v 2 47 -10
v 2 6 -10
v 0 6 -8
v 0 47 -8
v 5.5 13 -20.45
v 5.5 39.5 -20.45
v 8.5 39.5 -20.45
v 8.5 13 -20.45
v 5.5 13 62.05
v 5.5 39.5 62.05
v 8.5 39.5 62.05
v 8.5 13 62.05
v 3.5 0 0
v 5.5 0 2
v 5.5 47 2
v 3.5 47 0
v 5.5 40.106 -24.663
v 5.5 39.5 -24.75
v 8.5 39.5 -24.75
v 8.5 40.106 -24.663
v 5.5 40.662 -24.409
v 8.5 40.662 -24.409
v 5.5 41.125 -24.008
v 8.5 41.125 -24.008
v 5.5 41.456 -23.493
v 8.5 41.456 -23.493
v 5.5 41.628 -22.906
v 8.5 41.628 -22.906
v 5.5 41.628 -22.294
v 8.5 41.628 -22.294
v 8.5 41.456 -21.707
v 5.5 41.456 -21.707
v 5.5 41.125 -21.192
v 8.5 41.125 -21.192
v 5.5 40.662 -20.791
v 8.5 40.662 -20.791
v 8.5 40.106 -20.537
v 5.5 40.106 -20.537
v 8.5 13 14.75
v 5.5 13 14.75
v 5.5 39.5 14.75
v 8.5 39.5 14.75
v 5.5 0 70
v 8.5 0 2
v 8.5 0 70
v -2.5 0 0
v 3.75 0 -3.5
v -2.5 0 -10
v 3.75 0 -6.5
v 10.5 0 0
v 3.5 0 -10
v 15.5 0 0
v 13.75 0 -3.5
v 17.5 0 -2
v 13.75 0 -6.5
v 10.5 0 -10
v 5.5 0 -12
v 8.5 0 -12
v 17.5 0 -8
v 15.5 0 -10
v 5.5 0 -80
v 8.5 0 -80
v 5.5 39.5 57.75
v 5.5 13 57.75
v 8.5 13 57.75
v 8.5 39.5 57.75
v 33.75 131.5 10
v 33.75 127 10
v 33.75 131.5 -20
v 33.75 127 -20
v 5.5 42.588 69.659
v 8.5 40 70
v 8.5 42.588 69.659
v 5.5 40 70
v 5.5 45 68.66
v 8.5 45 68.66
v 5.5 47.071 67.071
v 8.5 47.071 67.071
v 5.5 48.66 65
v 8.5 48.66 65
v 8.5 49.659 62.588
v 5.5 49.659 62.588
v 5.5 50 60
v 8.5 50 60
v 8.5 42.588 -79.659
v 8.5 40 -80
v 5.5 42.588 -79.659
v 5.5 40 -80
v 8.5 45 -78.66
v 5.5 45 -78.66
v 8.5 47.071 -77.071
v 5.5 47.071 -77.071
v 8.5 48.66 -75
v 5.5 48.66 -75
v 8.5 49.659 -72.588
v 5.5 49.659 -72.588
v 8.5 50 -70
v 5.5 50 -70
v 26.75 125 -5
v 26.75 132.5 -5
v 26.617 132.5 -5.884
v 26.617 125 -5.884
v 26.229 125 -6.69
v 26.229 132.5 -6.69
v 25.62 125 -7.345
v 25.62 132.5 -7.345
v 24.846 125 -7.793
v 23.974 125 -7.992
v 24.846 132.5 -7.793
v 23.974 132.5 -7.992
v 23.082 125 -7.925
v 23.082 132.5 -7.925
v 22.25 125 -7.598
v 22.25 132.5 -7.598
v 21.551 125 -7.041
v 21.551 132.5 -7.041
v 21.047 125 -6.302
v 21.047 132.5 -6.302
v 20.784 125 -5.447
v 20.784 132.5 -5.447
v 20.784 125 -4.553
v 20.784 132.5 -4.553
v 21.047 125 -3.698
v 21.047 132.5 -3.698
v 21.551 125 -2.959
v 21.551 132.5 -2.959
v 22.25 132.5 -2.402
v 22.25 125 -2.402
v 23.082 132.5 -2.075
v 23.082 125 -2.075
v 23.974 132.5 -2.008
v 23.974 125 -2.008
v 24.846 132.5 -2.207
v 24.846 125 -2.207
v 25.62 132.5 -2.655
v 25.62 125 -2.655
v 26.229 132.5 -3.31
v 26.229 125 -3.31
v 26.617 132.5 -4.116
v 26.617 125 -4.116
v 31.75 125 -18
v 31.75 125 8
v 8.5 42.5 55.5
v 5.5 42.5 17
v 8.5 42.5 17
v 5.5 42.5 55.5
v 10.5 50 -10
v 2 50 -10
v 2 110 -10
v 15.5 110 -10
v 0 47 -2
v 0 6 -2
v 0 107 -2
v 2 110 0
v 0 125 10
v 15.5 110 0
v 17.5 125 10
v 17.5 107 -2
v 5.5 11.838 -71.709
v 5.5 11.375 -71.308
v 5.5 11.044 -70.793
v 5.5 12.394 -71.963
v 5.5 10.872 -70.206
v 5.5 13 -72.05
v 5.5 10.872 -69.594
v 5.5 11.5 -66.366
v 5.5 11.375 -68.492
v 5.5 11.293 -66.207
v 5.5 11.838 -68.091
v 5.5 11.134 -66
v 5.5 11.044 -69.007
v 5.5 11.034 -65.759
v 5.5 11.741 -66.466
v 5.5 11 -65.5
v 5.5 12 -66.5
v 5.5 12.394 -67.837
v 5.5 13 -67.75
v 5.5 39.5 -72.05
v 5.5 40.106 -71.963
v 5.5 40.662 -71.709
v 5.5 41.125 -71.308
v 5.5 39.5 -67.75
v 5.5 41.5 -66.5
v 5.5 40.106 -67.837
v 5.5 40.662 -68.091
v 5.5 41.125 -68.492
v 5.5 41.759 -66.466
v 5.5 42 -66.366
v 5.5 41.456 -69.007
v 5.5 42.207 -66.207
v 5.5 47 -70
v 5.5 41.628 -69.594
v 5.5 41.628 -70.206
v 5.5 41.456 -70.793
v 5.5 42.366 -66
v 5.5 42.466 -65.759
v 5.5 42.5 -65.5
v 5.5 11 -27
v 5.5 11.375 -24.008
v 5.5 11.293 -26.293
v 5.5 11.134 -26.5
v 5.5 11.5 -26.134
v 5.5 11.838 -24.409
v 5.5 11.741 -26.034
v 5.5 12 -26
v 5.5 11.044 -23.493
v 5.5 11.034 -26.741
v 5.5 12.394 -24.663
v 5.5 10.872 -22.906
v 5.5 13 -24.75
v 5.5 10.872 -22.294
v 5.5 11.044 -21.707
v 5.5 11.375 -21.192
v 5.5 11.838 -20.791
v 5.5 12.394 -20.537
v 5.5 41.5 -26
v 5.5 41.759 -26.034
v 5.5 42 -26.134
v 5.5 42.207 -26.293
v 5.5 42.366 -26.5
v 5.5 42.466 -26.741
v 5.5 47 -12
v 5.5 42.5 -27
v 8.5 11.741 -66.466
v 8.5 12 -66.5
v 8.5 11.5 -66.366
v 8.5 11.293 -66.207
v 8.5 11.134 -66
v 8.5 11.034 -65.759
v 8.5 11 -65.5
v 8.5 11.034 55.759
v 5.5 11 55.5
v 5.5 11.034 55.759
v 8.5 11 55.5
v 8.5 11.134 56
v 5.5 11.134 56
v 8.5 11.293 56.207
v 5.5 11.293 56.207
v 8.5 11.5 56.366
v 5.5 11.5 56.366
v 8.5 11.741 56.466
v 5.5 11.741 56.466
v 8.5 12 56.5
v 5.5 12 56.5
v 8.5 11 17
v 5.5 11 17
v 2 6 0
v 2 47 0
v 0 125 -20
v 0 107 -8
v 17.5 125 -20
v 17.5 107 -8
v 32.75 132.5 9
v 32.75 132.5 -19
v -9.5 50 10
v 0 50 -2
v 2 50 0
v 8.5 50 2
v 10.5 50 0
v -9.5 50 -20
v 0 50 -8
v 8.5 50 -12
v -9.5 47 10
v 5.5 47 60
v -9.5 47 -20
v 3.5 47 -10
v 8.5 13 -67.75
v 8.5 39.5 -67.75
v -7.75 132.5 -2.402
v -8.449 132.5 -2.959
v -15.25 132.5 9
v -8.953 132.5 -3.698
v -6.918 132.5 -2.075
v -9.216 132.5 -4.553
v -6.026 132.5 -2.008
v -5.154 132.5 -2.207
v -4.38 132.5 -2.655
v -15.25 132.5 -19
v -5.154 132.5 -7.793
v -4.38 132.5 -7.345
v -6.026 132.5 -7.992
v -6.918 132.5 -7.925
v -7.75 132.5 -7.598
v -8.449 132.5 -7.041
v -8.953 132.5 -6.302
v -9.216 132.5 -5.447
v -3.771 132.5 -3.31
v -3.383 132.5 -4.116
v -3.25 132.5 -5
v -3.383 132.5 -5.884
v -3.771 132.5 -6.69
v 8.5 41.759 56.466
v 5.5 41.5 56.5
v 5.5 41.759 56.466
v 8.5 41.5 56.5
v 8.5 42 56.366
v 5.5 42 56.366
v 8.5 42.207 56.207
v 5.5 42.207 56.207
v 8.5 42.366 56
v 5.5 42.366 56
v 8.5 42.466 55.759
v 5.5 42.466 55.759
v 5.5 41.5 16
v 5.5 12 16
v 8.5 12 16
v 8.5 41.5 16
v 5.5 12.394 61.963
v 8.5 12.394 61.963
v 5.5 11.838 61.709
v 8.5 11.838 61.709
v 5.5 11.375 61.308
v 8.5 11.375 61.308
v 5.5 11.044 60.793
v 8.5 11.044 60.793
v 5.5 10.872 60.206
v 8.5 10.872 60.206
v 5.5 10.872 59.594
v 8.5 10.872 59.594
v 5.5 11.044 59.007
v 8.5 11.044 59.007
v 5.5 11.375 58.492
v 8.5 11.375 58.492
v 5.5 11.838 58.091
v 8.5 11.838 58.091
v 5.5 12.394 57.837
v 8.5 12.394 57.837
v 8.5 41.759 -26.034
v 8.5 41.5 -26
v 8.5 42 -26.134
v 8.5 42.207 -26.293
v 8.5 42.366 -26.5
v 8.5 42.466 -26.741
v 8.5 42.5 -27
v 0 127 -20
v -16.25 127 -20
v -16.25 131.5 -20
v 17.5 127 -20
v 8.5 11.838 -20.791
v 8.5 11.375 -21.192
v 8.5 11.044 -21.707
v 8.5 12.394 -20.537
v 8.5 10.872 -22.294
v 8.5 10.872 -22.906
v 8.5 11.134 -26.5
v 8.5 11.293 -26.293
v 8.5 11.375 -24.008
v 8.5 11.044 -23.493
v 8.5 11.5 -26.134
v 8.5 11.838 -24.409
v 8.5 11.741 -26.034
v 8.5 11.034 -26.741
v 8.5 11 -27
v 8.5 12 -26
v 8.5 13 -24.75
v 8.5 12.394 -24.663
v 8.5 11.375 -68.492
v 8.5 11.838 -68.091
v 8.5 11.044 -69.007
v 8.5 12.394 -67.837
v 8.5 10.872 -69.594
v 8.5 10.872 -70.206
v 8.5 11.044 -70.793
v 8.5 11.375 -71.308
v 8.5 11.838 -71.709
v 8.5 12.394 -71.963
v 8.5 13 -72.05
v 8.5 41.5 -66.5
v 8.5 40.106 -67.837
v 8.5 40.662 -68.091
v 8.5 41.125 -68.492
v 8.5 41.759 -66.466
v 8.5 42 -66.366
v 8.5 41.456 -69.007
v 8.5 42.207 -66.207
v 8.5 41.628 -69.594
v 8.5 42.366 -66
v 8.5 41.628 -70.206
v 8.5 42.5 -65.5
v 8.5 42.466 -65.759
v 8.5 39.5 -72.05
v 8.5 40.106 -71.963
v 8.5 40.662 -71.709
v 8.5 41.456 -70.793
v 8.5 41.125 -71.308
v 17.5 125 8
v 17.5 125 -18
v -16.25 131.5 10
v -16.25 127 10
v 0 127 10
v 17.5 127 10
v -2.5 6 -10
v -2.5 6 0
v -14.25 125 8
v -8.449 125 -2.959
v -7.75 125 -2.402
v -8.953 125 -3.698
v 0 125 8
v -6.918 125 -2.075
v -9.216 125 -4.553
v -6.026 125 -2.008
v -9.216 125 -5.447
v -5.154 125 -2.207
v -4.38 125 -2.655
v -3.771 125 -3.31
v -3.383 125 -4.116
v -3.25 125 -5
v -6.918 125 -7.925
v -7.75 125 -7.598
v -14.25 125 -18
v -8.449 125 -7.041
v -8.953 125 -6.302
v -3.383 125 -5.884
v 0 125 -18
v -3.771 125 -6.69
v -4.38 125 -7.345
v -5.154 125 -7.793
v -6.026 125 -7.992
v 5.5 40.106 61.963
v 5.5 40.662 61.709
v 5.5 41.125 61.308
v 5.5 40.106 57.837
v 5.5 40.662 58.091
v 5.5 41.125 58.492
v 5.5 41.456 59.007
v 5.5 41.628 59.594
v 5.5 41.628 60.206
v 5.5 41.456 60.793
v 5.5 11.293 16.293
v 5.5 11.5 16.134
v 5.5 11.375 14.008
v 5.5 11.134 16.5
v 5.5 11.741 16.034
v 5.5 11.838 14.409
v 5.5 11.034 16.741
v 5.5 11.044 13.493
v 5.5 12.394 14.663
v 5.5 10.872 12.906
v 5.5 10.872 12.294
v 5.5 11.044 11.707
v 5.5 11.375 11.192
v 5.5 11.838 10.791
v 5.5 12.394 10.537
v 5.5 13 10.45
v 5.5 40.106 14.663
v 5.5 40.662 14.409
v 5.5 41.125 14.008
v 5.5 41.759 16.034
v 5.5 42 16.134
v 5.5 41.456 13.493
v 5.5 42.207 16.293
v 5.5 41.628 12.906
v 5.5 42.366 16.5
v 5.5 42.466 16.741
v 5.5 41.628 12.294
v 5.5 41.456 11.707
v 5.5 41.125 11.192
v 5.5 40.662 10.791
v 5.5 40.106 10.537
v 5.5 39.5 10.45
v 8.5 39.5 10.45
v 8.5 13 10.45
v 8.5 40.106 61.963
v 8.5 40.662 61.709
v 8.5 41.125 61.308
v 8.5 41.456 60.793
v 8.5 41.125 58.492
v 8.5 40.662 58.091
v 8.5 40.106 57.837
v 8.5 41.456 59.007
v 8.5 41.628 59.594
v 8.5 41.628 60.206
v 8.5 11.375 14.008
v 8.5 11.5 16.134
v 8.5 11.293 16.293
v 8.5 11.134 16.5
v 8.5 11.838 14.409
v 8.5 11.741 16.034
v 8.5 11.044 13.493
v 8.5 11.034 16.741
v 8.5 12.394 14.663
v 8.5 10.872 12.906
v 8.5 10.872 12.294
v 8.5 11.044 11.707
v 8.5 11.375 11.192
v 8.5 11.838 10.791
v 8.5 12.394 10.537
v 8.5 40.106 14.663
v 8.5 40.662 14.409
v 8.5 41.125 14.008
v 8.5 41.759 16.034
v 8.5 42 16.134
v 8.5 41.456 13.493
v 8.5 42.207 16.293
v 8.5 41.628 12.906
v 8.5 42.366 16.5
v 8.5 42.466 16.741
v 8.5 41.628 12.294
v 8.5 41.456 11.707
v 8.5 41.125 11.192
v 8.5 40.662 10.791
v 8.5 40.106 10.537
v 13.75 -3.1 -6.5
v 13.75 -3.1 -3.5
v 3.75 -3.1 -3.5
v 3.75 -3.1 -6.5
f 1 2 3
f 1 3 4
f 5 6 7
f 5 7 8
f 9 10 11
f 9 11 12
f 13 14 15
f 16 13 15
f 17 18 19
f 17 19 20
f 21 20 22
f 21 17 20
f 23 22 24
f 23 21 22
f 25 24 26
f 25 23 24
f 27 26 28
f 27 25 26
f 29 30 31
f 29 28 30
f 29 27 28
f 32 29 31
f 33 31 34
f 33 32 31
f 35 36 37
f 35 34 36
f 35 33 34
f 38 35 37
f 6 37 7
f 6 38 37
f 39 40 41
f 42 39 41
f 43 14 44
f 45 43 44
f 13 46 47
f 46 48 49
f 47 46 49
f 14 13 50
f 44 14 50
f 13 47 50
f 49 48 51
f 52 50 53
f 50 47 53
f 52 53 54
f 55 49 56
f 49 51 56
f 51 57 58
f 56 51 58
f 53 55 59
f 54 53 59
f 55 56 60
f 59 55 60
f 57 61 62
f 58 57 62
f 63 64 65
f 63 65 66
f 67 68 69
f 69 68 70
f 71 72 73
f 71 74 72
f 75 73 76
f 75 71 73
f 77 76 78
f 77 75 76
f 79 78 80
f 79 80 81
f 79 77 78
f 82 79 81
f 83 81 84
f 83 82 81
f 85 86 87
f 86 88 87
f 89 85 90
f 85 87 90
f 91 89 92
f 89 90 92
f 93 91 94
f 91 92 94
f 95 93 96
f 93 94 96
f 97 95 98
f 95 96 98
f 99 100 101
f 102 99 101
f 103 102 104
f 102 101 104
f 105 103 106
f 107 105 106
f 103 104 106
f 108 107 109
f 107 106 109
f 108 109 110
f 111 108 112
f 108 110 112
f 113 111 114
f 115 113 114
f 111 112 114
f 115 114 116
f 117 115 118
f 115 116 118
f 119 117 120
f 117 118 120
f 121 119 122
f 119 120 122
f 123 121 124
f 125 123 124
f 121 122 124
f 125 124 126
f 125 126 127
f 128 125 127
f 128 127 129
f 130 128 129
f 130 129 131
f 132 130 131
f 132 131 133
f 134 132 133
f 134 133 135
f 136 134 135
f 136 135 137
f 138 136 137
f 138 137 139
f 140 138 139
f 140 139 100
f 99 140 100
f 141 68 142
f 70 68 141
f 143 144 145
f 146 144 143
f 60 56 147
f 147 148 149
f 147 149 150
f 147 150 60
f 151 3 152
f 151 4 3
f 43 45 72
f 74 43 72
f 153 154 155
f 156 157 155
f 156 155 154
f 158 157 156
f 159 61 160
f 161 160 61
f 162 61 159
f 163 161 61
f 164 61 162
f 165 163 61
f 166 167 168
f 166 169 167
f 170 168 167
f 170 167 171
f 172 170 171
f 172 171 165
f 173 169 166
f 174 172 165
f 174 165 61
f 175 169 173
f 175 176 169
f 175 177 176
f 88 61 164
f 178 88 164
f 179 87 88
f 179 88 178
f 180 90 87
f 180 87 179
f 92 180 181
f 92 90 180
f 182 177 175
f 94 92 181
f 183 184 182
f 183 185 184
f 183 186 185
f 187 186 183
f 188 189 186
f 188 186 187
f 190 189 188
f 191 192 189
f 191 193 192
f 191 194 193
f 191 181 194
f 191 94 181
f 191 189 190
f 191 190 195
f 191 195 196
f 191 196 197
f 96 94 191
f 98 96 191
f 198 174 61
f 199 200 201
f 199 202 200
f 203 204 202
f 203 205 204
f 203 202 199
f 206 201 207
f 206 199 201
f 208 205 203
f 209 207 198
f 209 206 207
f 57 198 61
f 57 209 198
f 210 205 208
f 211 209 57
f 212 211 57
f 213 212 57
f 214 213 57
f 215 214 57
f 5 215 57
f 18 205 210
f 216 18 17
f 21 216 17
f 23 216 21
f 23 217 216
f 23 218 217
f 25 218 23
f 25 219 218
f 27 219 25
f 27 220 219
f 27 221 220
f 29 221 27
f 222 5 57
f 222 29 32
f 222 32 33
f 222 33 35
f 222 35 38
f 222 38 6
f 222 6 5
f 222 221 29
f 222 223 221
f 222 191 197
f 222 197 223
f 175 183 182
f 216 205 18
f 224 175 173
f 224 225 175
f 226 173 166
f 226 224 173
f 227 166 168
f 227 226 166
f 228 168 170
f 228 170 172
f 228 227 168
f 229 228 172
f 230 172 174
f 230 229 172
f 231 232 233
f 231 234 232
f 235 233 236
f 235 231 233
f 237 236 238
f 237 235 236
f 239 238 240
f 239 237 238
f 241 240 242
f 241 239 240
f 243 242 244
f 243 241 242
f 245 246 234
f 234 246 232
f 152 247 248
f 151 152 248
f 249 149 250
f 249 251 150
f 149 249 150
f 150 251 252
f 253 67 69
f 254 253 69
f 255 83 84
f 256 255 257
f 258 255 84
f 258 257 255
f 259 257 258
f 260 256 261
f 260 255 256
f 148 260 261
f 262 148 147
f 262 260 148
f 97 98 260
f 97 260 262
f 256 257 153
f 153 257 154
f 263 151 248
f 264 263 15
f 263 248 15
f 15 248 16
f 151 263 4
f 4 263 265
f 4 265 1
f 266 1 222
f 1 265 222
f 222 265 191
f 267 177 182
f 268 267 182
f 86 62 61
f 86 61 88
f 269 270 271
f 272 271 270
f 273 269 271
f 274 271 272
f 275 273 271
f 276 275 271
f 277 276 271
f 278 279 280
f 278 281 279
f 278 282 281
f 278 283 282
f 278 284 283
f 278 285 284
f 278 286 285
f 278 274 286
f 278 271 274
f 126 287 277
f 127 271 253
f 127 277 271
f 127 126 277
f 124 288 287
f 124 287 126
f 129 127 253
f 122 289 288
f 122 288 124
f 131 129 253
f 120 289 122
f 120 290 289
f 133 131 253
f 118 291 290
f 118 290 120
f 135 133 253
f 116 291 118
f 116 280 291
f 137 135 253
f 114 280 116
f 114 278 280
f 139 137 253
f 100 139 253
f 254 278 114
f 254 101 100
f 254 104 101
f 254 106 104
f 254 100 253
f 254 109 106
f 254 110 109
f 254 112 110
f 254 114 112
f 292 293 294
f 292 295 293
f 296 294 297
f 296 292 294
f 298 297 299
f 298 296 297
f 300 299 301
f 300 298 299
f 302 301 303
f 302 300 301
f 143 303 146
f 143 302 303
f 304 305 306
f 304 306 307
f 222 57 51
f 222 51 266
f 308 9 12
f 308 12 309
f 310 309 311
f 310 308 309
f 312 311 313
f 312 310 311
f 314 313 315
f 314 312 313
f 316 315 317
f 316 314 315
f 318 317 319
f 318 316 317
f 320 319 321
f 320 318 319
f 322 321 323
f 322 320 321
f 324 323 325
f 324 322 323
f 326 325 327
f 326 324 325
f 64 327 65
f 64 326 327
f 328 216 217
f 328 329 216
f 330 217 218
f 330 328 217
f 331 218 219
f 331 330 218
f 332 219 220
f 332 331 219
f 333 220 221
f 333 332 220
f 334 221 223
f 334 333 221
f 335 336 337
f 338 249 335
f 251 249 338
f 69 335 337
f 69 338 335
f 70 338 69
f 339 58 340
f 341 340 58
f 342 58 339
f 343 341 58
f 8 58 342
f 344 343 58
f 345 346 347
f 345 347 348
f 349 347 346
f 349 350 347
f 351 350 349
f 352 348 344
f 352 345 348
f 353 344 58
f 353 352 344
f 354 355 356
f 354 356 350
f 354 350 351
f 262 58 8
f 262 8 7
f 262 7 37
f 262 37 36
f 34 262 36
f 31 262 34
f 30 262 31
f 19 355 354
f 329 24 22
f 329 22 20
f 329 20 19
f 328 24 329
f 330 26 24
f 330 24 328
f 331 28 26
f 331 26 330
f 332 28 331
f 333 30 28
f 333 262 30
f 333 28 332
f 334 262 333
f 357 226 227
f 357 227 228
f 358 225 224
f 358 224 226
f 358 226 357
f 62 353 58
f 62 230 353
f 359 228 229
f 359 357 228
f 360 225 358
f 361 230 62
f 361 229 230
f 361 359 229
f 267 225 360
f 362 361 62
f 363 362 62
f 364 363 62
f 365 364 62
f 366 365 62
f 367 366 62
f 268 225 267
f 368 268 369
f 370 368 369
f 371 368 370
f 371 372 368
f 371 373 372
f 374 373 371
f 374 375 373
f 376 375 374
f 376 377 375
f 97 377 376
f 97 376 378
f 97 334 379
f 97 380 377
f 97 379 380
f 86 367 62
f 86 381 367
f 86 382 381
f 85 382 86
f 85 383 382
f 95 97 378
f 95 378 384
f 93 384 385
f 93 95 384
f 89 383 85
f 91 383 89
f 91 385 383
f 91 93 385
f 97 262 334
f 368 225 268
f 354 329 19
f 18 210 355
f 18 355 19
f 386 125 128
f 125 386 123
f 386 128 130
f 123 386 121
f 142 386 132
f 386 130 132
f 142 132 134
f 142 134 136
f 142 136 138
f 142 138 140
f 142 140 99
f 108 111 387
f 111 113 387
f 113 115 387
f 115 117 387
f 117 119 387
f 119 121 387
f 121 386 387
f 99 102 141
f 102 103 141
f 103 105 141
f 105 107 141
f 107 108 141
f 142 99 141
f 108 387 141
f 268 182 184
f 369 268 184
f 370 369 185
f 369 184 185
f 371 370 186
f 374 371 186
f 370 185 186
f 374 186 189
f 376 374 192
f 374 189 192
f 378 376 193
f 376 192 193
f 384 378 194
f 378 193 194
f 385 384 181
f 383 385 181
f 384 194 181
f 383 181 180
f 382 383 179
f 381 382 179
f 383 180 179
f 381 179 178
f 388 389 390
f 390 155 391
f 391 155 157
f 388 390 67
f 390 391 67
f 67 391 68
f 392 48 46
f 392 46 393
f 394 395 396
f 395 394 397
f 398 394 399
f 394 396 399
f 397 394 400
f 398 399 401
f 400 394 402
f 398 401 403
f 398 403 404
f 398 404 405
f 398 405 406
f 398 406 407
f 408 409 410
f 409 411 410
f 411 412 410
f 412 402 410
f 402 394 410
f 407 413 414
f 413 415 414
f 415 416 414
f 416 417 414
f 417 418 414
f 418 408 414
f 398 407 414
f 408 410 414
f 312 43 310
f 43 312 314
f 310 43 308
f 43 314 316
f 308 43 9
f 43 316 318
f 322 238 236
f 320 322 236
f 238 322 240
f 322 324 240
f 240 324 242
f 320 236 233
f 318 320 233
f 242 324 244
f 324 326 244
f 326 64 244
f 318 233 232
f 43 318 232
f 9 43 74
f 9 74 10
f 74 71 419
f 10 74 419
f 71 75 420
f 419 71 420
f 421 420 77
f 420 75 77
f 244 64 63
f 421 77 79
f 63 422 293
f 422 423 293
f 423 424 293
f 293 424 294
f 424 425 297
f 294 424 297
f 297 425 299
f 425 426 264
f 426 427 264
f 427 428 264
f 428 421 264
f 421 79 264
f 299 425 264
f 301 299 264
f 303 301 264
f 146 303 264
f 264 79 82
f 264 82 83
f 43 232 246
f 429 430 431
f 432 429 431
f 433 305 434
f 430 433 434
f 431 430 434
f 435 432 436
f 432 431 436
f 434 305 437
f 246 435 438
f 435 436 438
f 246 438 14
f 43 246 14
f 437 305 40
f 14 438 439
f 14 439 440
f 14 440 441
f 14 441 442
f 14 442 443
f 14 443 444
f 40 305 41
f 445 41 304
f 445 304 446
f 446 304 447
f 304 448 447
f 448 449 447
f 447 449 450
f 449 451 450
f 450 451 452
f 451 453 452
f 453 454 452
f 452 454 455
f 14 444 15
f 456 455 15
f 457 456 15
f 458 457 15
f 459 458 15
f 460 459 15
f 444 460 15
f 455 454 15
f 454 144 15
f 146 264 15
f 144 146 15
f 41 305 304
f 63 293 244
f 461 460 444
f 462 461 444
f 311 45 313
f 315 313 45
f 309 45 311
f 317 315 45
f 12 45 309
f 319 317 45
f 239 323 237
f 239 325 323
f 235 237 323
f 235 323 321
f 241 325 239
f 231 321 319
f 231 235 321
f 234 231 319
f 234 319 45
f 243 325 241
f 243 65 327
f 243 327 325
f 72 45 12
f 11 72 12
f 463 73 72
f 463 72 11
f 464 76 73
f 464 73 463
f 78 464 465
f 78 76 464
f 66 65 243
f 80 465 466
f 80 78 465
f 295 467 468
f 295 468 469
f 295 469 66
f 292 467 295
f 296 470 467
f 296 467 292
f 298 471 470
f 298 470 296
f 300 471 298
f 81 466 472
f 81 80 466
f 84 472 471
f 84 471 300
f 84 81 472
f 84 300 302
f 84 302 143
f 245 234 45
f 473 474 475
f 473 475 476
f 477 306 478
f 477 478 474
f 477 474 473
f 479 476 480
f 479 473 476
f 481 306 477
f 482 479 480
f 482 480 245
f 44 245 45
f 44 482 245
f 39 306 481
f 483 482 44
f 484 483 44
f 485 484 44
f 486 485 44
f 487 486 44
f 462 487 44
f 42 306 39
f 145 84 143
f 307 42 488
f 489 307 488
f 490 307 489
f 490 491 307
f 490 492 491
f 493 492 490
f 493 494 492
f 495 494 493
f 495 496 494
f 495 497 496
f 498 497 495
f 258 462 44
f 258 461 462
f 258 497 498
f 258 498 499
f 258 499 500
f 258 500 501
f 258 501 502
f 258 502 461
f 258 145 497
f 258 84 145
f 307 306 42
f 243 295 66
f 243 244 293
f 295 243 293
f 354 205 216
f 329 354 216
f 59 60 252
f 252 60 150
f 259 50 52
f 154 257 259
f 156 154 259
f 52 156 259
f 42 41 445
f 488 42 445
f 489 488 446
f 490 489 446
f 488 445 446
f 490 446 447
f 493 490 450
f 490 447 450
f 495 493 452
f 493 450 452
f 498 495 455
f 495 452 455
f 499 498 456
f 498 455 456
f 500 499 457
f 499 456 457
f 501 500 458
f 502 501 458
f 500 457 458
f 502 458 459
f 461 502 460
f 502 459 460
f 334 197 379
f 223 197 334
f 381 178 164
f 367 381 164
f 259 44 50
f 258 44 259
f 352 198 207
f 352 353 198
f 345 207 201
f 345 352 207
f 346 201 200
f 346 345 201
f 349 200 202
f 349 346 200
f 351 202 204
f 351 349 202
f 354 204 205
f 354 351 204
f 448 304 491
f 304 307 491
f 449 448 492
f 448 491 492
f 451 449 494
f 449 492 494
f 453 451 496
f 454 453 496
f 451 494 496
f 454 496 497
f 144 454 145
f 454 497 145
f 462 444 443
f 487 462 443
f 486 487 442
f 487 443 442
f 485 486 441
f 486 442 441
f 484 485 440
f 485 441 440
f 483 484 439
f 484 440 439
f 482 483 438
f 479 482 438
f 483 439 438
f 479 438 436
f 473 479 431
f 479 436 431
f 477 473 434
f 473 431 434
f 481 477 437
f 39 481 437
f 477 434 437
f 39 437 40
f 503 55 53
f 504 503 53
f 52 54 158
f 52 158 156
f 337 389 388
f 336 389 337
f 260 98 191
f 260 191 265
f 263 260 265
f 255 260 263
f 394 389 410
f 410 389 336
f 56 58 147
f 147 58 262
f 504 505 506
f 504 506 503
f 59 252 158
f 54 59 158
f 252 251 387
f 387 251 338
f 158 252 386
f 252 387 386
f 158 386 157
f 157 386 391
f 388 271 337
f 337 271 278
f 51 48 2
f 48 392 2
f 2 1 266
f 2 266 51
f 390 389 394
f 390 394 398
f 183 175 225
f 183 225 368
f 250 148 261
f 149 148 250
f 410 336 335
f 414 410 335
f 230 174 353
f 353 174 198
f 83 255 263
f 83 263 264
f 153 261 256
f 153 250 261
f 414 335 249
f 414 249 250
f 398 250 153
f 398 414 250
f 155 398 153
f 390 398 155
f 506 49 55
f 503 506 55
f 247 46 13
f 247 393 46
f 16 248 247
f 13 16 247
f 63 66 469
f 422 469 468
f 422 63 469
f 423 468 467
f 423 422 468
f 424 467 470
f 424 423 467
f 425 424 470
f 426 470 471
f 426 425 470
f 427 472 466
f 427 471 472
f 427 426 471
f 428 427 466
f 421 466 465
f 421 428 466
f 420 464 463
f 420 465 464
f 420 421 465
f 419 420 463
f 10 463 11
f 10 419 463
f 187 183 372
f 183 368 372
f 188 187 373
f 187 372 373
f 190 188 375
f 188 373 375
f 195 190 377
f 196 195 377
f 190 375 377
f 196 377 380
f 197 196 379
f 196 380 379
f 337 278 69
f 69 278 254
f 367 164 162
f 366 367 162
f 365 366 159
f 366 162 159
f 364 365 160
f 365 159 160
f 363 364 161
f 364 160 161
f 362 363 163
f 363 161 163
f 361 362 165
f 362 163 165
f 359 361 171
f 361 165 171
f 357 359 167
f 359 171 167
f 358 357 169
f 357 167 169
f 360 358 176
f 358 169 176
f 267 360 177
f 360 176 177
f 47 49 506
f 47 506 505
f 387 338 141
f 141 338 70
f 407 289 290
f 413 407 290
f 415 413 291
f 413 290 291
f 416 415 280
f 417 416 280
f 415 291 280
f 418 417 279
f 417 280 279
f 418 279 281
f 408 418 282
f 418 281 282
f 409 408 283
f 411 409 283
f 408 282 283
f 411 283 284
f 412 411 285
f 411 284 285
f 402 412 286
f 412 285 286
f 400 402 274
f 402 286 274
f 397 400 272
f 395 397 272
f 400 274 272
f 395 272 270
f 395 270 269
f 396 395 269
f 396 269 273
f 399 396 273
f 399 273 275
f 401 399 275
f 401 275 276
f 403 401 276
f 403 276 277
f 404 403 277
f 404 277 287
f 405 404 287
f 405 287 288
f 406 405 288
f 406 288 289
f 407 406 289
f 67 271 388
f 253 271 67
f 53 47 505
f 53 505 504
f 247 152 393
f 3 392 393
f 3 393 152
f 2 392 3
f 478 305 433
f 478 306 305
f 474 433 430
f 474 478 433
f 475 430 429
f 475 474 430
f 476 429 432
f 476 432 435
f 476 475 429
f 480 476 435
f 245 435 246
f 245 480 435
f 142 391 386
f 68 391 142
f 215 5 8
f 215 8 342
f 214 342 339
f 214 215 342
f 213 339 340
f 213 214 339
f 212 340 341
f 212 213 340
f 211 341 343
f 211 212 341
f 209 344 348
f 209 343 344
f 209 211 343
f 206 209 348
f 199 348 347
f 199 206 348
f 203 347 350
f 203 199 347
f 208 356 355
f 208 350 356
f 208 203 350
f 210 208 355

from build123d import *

# Parameters (mm, degrees)
SKETCH_2_W          = 17.5
SKETCH_2_H          = 10
EXTRUDE_1_DEPTH     = 125
SKETCH_3_W          = 50
SKETCH_3_H          = 30
EXTRUDE_2_DEPTH     = 7.5
CHAMFER_1_SIZE      = 1
SKETCH_4_R          = 3
CUT_EXTRUDE_1_DEPTH = 10
EXTRUDE_3_DEPTH     = 17.5
CHAMFER_2_SIZE      = 2
CHAMFER_3_SIZE      = 2
SKETCH_6_W          = 10
SKETCH_6_H          = 3
EXTRUDE_4_DEPTH     = 3.1
SKETCH_7_W          = 70
SKETCH_7_H          = 50
EXTRUDE_5_DEPTH     = 3.25
SKETCH_12_W         = 4.5
SKETCH_12_H         = 6
EXTRUDE_6_DEPTH     = 10
CUT_EXTRUDE_4_DEPTH = 10
SKETCH_15_W         = 70
SKETCH_15_H         = 50
CUT_EXTRUDE_7_DEPTH = 0.25
SKETCH_16_W         = 40.5
SKETCH_16_H         = 31.5
CUT_EXTRUDE_8_DEPTH = 39.25
CHAMFER_7_SIZE      = 2
FILLET_1_R          = 1
FILLET_2_R          = 10
EXTRUDE_7_DEPTH     = 3
CUT_EXTRUDE_9_DEPTH = 48


with BuildPart() as part:
    # 草图2 → 凸台-拉伸1 (new body)
    with BuildSketch(Plane(origin=(0, 0, 0), x_dir=(1, 0, 0), z_dir=(0, 1, 0))):
        with Locations((8.75, 5)):
            Rectangle(SKETCH_2_W, SKETCH_2_H)
    extrude(amount=EXTRUDE_1_DEPTH)

    # 草图3 → 凸台-拉伸2 (add)
    with BuildSketch(Plane(origin=(0, 125, 0), x_dir=(1, 0, 0), z_dir=(0, 1, 0))):
        with Locations((8.75, 5)):
            Rectangle(SKETCH_3_W, SKETCH_3_H)
    extrude(amount=EXTRUDE_2_DEPTH)

    # 倒角1
    chamfer_1_edges = [part.edges().sort_by_distance(p)[0] for p in [
        (33.75, 132.5, -5),
        (8.75, 132.5, -20),
        (-16.25, 132.5, -5),
        (8.75, 132.5, 10),
    ]]
    chamfer(chamfer_1_edges, length=CHAMFER_1_SIZE)

    # 草图4 → 切除-拉伸1 (cut)
    with BuildSketch(Plane(origin=(0, 132.5, 0), x_dir=(1, 0, 0), z_dir=(0, 1, 0))):
        with Locations((23.75, 5)):
            Circle(SKETCH_4_R)
        with Locations((-6.25, 5)):
            Circle(SKETCH_4_R)
    extrude(amount=-CUT_EXTRUDE_1_DEPTH, mode=Mode.SUBTRACT)

    # 草图5 → 凸台-拉伸3 (add)
    with BuildSketch(Plane(origin=(17.5, 0, 0), x_dir=(0, 0, -1), z_dir=(1, 0, 0))):
        Polygon((10, 125), (20, 125), (10, 110), align=None)
        Polygon((0, 125), (-10, 125), (0, 110), align=None)
    extrude(amount=-EXTRUDE_3_DEPTH)

    # 倒角2
    chamfer_2_edges = [part.edges().sort_by_distance(p)[0] for p in [
        (-8.125, 125, -20),
        (33.75, 125, -5),
        (-16.25, 125, -5),
        (-8.125, 125, 10),
        (25.625, 125, -20),
        (25.625, 125, 10),
    ]]
    chamfer(chamfer_2_edges, length=CHAMFER_2_SIZE)

    # 倒角3
    chamfer_3_edges = [part.edges().sort_by_distance(p)[0] for p in [
        (0, 55, -10),
        (17.5, 55, -10),
        (17.5, 55, 0),
        (0, 55, 0),
    ]]
    chamfer(chamfer_3_edges, length=CHAMFER_3_SIZE)

    # 草图6 → 凸台-拉伸4 (add)
    with BuildSketch(Plane.XZ):
        with Locations((8.75, -5)):
            Rectangle(SKETCH_6_W, SKETCH_6_H)
    extrude(amount=EXTRUDE_4_DEPTH)

    # 草图7 → 凸台-拉伸5 (add)
    with BuildSketch(Plane.ZY.offset(-8.75)):
        with Locations((-45, 25)):
            Rectangle(SKETCH_7_W, SKETCH_7_H)
    extrude_5 = extrude(amount=EXTRUDE_5_DEPTH)

    # 镜向1: 凸台-拉伸5 across plane
    add(extrude_5.mirror(Plane(origin=(0, 0, -5), x_dir=(1, 0, 0), z_dir=(0, 0, -1))))

    # 草图12 → 凸台-拉伸6 (add)
    with BuildSketch(Plane(origin=(0, 0, -10), x_dir=(-1, 0, 0), z_dir=(0, 0, -1))):
        with Locations((-17.75, 3)):
            Rectangle(SKETCH_12_W, SKETCH_12_H)
    extrude_6 = extrude(amount=-EXTRUDE_6_DEPTH)

    # 镜向2: 凸台-拉伸6 across plane
    add(extrude_6.mirror(Plane.ZY.offset(-8.75)))

    # 草图13 → 切除-拉伸4 (cut)
    with BuildSketch(Plane(origin=(0, 6, 0), x_dir=(1, 0, 0), z_dir=(0, 1, 0))):
        Polygon((17.5, 8), (17.5, 2), (15.5, 0), (20, 0), (20, 10), (15.5, 10), align=None)
    extrude(amount=-CUT_EXTRUDE_4_DEPTH, mode=Mode.SUBTRACT)

    # 草图15 → 切除-拉伸7 (cut)
    with BuildSketch(Plane(origin=(8.75, 0, 0), x_dir=(0, 0, -1), z_dir=(1, 0, 0))):
        with Locations((-35, 25)):
            Rectangle(SKETCH_15_W, SKETCH_15_H)
        with Locations((45, 25)):
            Rectangle(SKETCH_15_W, SKETCH_15_H)
    extrude(amount=-CUT_EXTRUDE_7_DEPTH, mode=Mode.SUBTRACT)

    # 草图16 → 切除-拉伸8 (cut)
    with BuildSketch(Plane.ZY.offset(-5.5)):
        with Locations((-46.25, 26.75)):
            Rectangle(SKETCH_16_W, SKETCH_16_H)
        with Locations((36.25, 26.75)):
            Rectangle(SKETCH_16_W, SKETCH_16_H)
    extrude(amount=-CUT_EXTRUDE_8_DEPTH, mode=Mode.SUBTRACT)

    # 倒角7
    chamfer_7_edges = [part.edges().sort_by_distance(p)[0] for p in [
        (5.5, 25, -10),
        (5.5, 25, 0),
        (8.5, 25, 0),
        (8.5, 25, -10),
    ]]
    chamfer(chamfer_7_edges, length=CHAMFER_7_SIZE)

    # 圆角1
    fillet_1_edges = [part.edges().sort_by_distance(p)[0] for p in [
        (7, 42.5, -26),
        (7, 11, -26),
        (7, 11, -66.5),
        (7, 42.5, -66.5),
        (7, 11, 16),
        (7, 42.5, 16),
        (7, 42.5, 56.5),
        (7, 11, 56.5),
    ]]
    fillet(fillet_1_edges, radius=FILLET_1_R)

    # 圆角2
    fillet_2_edges = [part.edges().sort_by_distance(p)[0] for p in [
        (7, 50, -80),
        (7, 50, 70),
    ]]
    fillet(fillet_2_edges, radius=FILLET_2_R)

    # 草图17 → 凸台-拉伸7 (add)
    with BuildSketch(Plane(origin=(0, 50, 0), x_dir=(1, 0, 0), z_dir=(0, 1, 0))):
        Polygon((5.5, 70), (-9.5, 20), (-9.5, -10), (5.5, -60), align=None)
    extrude(amount=-EXTRUDE_7_DEPTH)

    # 草图18 → 切除-拉伸9 (cut)
    with BuildSketch(Plane.ZY.offset(-5.5)):
        with BuildLine():
            Line((62.05, 39.5), (62.05, 13))
            ThreePointArc((62.05, 13), (59.9, 10.85), (57.75, 13))
            Line((57.75, 13), (57.75, 39.5))
            ThreePointArc((57.75, 39.5), (59.9, 41.65), (62.05, 39.5))
        make_face()
        with BuildLine():
            Line((10.45, 39.5), (10.45, 13))
            ThreePointArc((10.45, 13), (12.6, 10.85), (14.75, 13))
            Line((14.75, 13), (14.75, 39.5))
            ThreePointArc((14.75, 39.5), (12.6, 41.65), (10.45, 39.5))
        make_face()
        with BuildLine():
            Line((-20.45, 39.5), (-20.45, 13))
            ThreePointArc((-20.45, 13), (-22.6, 10.85), (-24.75, 13))
            Line((-24.75, 13), (-24.75, 39.5))
            ThreePointArc((-24.75, 39.5), (-22.6, 41.65), (-20.45, 39.5))
        make_face()
        with BuildLine():
            Line((-72.05, 39.5), (-72.05, 13))
            ThreePointArc((-72.05, 13), (-69.9, 10.85), (-67.75, 13))
            Line((-67.75, 13), (-67.75, 39.5))
            ThreePointArc((-67.75, 39.5), (-69.9, 41.65), (-72.05, 39.5))
        make_face()
    extrude(amount=-CUT_EXTRUDE_9_DEPTH, mode=Mode.SUBTRACT)


solid = part.part
